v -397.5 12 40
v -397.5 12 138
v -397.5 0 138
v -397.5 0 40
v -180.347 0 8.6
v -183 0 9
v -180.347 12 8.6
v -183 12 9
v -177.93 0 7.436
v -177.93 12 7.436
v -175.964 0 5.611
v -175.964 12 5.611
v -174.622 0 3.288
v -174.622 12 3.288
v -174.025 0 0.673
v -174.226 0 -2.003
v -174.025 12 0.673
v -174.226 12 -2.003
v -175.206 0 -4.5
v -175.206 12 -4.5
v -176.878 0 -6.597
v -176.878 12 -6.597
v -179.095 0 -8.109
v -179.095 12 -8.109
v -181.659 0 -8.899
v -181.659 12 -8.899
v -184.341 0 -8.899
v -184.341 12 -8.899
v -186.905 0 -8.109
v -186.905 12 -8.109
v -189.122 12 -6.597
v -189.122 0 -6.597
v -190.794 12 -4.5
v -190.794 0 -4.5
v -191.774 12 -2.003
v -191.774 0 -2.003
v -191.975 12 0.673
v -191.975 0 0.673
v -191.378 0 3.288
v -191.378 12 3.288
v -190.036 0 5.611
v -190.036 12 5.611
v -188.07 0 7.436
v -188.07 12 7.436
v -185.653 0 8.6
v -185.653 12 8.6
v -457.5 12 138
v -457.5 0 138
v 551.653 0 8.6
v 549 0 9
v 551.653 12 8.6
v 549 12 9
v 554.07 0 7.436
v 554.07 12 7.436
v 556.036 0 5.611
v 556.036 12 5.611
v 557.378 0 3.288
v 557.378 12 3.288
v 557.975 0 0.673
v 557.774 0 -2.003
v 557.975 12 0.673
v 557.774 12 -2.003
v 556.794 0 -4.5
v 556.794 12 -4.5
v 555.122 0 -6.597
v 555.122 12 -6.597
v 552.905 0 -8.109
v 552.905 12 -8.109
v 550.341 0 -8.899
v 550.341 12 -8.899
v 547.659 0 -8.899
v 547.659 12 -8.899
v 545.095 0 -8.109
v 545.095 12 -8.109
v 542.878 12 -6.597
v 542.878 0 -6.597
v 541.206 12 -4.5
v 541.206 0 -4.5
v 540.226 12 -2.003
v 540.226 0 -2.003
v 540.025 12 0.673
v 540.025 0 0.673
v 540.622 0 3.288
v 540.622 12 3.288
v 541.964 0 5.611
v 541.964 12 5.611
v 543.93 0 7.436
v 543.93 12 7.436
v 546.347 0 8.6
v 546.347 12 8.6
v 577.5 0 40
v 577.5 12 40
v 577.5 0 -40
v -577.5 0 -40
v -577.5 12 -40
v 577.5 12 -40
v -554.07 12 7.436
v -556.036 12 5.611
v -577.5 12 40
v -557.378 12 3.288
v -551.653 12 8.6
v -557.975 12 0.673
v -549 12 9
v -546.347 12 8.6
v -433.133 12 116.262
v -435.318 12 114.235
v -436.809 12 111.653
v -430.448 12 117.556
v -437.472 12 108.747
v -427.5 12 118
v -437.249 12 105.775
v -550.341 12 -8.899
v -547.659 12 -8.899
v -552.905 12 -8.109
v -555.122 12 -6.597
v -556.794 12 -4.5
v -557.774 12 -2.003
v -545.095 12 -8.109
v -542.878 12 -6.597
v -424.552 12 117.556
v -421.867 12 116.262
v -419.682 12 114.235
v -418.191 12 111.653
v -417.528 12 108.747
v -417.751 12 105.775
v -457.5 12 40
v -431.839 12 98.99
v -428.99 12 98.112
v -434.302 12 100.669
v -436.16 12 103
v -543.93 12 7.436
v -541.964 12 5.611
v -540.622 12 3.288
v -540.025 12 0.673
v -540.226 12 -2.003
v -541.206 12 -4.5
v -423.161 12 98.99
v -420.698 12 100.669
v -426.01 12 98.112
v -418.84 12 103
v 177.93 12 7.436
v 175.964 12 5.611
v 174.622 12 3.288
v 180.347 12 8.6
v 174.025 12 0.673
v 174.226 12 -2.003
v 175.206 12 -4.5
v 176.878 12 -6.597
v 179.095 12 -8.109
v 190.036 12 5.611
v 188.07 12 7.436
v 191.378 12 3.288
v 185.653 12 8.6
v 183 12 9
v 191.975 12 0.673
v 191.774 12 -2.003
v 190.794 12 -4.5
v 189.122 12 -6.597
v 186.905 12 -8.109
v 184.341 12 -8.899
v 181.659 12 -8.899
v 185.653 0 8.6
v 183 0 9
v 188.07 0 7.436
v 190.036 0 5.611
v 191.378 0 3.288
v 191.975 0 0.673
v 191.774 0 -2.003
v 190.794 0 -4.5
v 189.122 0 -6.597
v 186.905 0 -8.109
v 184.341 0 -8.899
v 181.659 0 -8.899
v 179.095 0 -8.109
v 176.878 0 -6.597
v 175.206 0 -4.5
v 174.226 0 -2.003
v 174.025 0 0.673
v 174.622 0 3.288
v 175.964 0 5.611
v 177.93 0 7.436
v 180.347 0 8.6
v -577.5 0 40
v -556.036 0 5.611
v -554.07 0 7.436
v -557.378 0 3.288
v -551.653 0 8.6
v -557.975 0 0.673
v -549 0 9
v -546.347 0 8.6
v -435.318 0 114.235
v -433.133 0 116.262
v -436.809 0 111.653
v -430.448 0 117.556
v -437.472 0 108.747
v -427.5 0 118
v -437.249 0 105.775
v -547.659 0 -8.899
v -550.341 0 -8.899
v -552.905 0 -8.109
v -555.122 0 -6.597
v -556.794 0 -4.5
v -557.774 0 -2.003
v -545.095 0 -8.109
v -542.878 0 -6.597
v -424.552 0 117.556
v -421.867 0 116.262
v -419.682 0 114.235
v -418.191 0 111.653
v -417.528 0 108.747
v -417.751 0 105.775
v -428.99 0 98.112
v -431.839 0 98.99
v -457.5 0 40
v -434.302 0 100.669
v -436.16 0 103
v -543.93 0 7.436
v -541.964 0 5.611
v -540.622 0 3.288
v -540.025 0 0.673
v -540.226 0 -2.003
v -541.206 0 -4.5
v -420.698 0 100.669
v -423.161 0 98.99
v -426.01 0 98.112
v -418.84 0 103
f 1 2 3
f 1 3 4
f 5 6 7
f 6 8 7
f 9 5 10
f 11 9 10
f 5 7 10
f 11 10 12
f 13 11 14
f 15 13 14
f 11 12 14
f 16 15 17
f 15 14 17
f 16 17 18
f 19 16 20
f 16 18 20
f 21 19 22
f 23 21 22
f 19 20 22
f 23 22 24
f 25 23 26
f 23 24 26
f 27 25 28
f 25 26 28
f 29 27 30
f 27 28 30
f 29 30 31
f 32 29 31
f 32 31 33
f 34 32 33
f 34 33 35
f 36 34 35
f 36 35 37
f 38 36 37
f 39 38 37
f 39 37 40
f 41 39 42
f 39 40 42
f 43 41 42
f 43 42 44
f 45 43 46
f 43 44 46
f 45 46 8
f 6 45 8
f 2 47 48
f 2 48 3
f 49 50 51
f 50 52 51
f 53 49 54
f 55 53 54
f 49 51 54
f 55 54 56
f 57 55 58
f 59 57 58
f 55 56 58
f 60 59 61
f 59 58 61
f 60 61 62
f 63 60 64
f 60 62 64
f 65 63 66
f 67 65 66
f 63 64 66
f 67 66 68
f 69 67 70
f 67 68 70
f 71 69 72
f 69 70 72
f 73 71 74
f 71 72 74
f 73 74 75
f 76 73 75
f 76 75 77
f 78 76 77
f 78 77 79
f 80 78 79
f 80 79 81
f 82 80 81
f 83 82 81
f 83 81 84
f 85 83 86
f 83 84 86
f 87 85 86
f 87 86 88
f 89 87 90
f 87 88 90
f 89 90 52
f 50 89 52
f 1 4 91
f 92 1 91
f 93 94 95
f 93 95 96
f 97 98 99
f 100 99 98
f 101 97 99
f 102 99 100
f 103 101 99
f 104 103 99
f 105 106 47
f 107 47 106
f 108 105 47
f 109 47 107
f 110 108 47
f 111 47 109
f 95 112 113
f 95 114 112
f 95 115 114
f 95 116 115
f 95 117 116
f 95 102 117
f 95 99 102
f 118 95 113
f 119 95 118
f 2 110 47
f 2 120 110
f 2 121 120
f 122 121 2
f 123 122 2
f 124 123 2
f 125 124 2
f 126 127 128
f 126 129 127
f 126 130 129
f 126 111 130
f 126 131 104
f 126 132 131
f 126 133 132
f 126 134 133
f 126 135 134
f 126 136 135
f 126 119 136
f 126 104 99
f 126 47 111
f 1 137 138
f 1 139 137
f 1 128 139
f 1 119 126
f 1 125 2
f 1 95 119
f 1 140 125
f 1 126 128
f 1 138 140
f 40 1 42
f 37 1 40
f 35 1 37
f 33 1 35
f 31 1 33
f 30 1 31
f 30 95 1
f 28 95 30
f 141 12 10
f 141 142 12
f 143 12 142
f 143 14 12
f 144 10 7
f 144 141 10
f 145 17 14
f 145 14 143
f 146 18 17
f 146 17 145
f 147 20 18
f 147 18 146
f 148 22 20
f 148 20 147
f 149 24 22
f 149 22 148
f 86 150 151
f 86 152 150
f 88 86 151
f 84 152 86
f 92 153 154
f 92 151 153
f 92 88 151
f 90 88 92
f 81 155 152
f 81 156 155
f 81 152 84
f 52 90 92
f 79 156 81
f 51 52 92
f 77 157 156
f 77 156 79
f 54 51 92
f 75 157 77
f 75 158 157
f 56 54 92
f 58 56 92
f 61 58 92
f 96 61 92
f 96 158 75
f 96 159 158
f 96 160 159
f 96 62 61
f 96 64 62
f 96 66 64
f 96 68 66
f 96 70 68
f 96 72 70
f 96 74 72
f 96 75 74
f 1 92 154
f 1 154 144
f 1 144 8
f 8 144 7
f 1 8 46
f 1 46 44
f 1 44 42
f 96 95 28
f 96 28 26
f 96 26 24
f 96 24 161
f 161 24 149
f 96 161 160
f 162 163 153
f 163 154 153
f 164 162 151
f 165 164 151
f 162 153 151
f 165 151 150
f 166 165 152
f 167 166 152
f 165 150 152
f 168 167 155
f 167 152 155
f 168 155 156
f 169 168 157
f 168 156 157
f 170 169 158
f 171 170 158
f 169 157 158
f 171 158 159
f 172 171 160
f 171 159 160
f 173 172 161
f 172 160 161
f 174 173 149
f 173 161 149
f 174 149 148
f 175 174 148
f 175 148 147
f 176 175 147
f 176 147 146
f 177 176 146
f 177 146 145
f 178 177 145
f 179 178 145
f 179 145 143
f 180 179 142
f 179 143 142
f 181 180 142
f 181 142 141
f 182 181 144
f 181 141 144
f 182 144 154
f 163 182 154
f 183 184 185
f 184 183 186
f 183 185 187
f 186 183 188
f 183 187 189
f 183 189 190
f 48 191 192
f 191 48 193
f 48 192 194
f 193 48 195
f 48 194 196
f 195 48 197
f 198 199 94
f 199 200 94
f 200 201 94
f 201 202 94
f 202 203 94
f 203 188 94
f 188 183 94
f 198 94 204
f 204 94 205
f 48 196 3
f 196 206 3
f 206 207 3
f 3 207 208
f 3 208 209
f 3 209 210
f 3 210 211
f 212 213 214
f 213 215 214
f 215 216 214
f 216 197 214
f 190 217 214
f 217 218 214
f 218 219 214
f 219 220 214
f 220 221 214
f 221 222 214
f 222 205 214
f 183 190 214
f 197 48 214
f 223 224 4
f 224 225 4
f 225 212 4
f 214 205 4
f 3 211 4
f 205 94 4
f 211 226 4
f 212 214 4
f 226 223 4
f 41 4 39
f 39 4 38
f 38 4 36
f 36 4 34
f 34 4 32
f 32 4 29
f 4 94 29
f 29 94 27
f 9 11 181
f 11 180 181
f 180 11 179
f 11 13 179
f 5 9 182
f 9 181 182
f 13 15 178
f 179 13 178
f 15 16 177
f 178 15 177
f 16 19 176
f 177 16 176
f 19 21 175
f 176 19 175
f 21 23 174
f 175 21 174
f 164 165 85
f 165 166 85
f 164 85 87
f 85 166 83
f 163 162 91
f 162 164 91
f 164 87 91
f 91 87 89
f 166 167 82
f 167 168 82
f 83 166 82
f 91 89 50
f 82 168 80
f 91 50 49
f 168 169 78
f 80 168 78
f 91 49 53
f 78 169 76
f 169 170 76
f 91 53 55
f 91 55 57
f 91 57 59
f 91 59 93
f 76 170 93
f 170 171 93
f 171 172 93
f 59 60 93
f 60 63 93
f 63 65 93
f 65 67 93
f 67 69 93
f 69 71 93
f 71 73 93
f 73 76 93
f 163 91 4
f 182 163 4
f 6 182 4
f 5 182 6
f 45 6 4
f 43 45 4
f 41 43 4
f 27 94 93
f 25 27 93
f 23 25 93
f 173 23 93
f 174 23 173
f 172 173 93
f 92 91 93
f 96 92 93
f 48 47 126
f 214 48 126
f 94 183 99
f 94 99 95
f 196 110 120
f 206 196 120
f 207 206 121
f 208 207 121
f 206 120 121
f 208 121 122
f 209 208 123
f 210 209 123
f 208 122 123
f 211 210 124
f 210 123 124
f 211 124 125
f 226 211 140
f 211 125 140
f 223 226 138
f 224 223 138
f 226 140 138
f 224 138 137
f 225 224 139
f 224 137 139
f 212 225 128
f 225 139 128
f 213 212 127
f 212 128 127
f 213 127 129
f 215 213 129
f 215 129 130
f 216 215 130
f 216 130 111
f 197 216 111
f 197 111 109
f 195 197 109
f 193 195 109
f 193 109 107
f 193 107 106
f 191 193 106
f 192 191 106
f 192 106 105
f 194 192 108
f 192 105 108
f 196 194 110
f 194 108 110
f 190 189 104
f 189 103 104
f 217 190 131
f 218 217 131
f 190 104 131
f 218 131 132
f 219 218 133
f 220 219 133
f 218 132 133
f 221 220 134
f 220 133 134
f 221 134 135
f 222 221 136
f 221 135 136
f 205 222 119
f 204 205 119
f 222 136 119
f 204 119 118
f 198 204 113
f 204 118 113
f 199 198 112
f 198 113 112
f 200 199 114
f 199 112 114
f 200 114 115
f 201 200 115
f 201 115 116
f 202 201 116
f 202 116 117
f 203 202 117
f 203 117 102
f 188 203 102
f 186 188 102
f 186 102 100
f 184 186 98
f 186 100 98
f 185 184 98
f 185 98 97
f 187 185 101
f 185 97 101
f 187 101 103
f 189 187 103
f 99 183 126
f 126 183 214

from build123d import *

# Parameters (mm, degrees)
SKETCH1_W           = 1155
SKETCH1_H           = 80
BOSS_EXTRUDE1_DEPTH = 12
SKETCH2_R           = 9
CUT_EXTRUDE1_DEPTH  = 580.007987855
LPATTERN1_COUNT     = 4
LPATTERN1_PITCH     = 366
SKETCH3_W           = 60
SKETCH3_H           = 98
SKETCH3_R           = 10
BOSS_EXTRUDE2_DEPTH = 12


with BuildPart() as part:
    # Sketch1 → Boss-Extrude1 (new body)
    with BuildSketch(Plane(origin=(0, 0, 0), x_dir=(1, 0, 0), z_dir=(0, 1, 0))):
        Rectangle(SKETCH1_W, SKETCH1_H)
    extrude(amount=BOSS_EXTRUDE1_DEPTH)

    # Sketch2 → Cut-Extrude1 (cut, symmetric)
    with BuildSketch(Plane(origin=(0, 12, 0), x_dir=(1, 0, 0), z_dir=(0, 1, 0))):
        with Locations(Location((-549, 0, 0), (0, 0, 270))):
            Circle(SKETCH2_R)
    cut_extrude1 = extrude(amount=CUT_EXTRUDE1_DEPTH, both=True, mode=Mode.SUBTRACT)

    # LPattern1: Cut-Extrude1 ×4
    with Locations(*[(i * LPATTERN1_PITCH, 0, 0) for i in range(1, LPATTERN1_COUNT)]):
        add(cut_extrude1, mode=Mode.SUBTRACT)

    # Sketch3 → Boss-Extrude2 (add)
    with BuildSketch(Plane(origin=(0, 12, 0), x_dir=(1, 0, 0), z_dir=(0, 1, 0))):
        with Locations((-427.5, -89)):
            Rectangle(SKETCH3_W, SKETCH3_H)
        with Locations(Location((-427.5, -108, 0), (0, 0, 270))):
            Circle(SKETCH3_R, mode=Mode.SUBTRACT)
    extrude(amount=-BOSS_EXTRUDE2_DEPTH)


solid = part.part
